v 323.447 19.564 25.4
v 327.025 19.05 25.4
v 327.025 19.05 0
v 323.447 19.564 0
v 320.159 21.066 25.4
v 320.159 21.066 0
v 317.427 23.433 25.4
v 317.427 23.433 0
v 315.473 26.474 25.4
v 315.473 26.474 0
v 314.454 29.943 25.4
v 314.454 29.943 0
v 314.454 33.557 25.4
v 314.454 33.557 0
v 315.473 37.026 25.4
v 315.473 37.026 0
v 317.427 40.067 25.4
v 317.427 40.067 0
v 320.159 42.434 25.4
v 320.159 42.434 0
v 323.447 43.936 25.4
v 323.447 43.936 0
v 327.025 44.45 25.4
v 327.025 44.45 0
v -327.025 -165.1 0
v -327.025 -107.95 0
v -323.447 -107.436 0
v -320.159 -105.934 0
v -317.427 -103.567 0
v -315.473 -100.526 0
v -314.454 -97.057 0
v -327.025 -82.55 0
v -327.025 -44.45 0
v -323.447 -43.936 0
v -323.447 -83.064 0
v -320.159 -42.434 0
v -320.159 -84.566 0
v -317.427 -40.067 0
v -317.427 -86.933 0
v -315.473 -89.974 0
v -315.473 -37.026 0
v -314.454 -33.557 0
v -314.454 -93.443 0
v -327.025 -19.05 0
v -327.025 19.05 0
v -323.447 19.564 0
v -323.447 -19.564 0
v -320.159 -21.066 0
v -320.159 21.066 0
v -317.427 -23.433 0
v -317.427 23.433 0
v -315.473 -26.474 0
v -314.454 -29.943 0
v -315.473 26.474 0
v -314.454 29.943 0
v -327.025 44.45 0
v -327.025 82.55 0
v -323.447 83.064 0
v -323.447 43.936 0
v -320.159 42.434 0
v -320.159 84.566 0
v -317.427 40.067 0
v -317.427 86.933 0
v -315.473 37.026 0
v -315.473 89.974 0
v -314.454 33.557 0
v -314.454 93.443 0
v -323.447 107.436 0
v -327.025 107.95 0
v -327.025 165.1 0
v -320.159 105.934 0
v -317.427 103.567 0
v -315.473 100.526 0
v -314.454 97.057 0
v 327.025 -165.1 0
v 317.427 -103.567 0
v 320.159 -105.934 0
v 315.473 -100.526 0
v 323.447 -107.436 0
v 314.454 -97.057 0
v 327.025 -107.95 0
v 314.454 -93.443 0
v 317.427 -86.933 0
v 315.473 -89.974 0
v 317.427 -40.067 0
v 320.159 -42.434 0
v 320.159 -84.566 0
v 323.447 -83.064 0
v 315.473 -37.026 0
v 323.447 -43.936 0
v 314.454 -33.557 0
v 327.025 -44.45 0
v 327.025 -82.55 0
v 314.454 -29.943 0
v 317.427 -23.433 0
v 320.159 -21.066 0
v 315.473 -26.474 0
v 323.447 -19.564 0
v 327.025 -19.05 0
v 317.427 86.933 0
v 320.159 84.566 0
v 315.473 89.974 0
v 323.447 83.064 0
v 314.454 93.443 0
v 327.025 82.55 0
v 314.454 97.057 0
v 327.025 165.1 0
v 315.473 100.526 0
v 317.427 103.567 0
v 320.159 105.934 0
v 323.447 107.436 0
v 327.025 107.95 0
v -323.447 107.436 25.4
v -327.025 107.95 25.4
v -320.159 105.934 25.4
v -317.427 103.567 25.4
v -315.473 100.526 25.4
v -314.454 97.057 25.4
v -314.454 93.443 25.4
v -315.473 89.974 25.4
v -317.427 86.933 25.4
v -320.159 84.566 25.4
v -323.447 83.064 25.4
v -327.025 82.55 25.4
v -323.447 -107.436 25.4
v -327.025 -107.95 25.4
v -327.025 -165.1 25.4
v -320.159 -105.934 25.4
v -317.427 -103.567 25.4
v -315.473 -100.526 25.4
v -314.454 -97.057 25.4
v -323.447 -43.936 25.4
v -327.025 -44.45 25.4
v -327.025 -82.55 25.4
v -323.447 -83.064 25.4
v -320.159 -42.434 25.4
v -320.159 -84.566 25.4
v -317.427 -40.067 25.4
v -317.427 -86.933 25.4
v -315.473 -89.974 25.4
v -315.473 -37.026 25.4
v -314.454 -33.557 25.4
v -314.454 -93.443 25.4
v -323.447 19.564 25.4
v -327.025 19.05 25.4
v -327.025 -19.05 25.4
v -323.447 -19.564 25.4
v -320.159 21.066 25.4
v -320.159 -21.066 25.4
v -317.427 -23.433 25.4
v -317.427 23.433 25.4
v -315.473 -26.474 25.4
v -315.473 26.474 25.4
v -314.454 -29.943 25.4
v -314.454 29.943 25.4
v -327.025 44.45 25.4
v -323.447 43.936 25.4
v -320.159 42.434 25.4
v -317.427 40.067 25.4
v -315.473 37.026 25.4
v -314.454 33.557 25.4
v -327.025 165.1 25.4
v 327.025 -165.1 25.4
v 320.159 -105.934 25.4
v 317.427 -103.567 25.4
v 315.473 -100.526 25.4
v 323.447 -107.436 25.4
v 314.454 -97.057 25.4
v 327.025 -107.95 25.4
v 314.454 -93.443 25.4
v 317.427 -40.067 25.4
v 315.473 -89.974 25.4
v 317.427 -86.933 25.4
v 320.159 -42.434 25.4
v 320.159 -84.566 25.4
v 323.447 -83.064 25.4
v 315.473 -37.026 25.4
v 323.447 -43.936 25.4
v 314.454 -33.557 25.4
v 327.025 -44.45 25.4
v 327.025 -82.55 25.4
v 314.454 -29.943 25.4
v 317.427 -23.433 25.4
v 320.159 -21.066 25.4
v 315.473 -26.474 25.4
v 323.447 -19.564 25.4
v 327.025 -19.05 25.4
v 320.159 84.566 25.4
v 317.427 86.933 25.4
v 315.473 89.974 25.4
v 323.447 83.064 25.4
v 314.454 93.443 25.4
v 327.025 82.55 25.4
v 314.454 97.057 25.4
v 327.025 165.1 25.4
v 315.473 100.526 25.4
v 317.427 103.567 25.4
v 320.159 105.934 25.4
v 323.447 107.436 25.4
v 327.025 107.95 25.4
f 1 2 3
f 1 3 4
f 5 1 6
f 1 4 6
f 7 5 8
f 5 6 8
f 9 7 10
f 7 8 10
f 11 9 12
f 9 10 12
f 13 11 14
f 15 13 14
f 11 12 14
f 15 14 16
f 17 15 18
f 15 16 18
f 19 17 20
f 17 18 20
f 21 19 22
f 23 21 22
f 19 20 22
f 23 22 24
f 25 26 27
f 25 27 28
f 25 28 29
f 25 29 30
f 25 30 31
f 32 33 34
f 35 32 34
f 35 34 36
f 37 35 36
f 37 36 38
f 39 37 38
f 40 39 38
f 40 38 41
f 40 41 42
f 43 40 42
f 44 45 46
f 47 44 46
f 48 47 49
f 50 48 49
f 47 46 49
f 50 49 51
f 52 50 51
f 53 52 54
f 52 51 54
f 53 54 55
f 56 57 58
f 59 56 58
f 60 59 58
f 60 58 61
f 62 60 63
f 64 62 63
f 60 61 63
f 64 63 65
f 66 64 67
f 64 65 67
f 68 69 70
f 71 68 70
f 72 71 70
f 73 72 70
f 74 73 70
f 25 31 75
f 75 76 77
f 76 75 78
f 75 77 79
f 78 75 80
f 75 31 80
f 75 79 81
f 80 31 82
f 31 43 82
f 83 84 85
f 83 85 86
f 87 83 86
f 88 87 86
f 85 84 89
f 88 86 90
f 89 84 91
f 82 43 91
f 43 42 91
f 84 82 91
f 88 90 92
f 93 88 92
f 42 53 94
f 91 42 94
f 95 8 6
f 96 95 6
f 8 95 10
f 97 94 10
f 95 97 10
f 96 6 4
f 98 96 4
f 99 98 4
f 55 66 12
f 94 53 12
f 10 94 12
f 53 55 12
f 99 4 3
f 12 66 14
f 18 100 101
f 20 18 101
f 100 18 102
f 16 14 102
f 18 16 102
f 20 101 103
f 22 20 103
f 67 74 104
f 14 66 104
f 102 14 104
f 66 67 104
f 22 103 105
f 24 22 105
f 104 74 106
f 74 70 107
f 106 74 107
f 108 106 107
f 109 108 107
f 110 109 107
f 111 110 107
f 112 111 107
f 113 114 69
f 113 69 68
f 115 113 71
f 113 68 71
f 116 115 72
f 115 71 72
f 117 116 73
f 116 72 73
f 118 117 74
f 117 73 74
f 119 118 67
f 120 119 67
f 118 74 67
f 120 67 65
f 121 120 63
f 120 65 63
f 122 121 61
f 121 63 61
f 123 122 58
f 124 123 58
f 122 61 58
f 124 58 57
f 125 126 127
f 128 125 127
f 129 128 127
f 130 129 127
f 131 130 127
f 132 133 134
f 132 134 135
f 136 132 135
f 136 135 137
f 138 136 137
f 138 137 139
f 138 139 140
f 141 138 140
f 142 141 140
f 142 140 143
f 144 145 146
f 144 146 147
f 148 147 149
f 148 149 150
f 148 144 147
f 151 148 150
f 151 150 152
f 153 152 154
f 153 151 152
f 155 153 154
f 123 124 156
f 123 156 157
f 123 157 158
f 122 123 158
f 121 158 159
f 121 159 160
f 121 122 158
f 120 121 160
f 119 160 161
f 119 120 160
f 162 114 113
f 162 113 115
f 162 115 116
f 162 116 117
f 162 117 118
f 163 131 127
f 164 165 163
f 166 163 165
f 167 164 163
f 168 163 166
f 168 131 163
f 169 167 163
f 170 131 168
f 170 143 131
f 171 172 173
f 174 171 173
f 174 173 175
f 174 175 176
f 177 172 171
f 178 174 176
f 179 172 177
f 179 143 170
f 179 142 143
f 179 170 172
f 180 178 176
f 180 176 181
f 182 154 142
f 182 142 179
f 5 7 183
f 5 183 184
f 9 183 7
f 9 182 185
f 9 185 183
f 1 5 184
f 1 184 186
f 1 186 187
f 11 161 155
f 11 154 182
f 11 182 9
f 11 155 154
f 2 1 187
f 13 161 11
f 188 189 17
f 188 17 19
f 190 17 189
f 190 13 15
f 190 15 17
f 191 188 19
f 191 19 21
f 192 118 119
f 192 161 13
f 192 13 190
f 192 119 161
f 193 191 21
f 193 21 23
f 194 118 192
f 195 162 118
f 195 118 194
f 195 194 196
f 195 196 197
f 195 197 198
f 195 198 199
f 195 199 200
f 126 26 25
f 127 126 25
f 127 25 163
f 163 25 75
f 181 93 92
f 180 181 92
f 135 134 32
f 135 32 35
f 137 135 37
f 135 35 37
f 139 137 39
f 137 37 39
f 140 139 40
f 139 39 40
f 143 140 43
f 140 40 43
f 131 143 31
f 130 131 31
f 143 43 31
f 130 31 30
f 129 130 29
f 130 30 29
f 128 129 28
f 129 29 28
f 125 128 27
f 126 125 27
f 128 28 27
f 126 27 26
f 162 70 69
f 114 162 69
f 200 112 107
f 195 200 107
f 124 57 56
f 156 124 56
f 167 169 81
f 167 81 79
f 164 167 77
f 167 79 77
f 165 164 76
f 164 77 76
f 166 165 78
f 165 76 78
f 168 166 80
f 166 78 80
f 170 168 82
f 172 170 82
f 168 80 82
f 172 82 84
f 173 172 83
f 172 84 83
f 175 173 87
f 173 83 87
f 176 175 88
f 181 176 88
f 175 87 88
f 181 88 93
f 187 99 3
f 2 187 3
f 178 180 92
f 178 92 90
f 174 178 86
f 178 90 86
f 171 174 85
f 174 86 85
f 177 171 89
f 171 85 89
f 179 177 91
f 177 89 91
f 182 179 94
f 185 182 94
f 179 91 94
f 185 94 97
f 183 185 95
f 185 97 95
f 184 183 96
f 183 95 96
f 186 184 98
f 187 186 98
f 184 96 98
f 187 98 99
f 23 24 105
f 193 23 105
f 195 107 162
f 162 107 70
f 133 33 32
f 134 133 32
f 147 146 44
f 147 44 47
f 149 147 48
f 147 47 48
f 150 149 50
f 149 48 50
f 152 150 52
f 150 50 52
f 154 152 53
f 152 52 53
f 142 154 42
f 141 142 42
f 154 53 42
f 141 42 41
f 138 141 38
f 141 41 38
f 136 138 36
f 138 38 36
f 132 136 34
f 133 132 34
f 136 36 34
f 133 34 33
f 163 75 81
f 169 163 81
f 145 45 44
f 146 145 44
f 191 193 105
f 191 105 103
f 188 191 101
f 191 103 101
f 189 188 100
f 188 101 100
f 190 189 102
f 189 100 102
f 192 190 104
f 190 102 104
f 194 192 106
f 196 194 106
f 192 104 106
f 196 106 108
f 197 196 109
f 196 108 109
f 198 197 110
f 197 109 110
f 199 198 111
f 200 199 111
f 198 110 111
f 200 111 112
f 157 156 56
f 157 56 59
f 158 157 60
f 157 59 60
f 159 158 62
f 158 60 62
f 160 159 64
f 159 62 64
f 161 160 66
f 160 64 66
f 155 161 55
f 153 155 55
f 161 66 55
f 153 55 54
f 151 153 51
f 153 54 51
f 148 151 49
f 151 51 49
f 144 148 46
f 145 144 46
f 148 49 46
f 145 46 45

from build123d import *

# Parameters (mm, degrees)
F1_DEPTH = 25.4


with BuildPart() as f1:
    # F0 (on Top) → F1 (new body)
    with BuildSketch(Plane.XY):
        with BuildLine():
            Line((327.025, 107.95), (327.025, 165.1))
            Line((327.025, 165.1), (0, 165.1))
            Line((0, 165.1), (0, -165.1))
            Line((0, -165.1), (327.025, -165.1))
            Line((327.025, -165.1), (327.025, -107.95))
            ThreePointArc((327.025, -107.95), (314.325, -95.25), (327.025, -82.55))
            Line((327.025, -82.55), (327.025, -44.45))
            ThreePointArc((327.025, -44.45), (314.325, -31.75), (327.025, -19.05))
            Line((327.025, -19.05), (327.025, 19.05))
            ThreePointArc((327.025, 19.05), (314.325, 31.75), (327.025, 44.45))
            Line((327.025, 44.45), (327.025, 82.55))
            ThreePointArc((327.025, 82.55), (314.325, 95.25), (327.025, 107.95))
        make_face()
        with BuildLine():
            Line((0, -165.1), (0, 165.1))
            Line((0, 165.1), (-327.025, 165.1))
            Line((-327.025, 165.1), (-327.025, 107.95))
            ThreePointArc((-327.025, 107.95), (-314.325, 95.25), (-327.025, 82.55))
            Line((-327.025, 82.55), (-327.025, 44.45))
            ThreePointArc((-327.025, 44.45), (-314.325, 31.75), (-327.025, 19.05))
            Line((-327.025, 19.05), (-327.025, -19.05))
            ThreePointArc((-327.025, -19.05), (-314.325, -31.75), (-327.025, -44.45))
            Line((-327.025, -44.45), (-327.025, -82.55))
            ThreePointArc((-327.025, -82.55), (-314.325, -95.25), (-327.025, -107.95))
            Line((-327.025, -107.95), (-327.025, -165.1))
            Line((-327.025, -165.1), (0, -165.1))
        make_face()
    extrude(amount=F1_DEPTH)


solid = f1.part
